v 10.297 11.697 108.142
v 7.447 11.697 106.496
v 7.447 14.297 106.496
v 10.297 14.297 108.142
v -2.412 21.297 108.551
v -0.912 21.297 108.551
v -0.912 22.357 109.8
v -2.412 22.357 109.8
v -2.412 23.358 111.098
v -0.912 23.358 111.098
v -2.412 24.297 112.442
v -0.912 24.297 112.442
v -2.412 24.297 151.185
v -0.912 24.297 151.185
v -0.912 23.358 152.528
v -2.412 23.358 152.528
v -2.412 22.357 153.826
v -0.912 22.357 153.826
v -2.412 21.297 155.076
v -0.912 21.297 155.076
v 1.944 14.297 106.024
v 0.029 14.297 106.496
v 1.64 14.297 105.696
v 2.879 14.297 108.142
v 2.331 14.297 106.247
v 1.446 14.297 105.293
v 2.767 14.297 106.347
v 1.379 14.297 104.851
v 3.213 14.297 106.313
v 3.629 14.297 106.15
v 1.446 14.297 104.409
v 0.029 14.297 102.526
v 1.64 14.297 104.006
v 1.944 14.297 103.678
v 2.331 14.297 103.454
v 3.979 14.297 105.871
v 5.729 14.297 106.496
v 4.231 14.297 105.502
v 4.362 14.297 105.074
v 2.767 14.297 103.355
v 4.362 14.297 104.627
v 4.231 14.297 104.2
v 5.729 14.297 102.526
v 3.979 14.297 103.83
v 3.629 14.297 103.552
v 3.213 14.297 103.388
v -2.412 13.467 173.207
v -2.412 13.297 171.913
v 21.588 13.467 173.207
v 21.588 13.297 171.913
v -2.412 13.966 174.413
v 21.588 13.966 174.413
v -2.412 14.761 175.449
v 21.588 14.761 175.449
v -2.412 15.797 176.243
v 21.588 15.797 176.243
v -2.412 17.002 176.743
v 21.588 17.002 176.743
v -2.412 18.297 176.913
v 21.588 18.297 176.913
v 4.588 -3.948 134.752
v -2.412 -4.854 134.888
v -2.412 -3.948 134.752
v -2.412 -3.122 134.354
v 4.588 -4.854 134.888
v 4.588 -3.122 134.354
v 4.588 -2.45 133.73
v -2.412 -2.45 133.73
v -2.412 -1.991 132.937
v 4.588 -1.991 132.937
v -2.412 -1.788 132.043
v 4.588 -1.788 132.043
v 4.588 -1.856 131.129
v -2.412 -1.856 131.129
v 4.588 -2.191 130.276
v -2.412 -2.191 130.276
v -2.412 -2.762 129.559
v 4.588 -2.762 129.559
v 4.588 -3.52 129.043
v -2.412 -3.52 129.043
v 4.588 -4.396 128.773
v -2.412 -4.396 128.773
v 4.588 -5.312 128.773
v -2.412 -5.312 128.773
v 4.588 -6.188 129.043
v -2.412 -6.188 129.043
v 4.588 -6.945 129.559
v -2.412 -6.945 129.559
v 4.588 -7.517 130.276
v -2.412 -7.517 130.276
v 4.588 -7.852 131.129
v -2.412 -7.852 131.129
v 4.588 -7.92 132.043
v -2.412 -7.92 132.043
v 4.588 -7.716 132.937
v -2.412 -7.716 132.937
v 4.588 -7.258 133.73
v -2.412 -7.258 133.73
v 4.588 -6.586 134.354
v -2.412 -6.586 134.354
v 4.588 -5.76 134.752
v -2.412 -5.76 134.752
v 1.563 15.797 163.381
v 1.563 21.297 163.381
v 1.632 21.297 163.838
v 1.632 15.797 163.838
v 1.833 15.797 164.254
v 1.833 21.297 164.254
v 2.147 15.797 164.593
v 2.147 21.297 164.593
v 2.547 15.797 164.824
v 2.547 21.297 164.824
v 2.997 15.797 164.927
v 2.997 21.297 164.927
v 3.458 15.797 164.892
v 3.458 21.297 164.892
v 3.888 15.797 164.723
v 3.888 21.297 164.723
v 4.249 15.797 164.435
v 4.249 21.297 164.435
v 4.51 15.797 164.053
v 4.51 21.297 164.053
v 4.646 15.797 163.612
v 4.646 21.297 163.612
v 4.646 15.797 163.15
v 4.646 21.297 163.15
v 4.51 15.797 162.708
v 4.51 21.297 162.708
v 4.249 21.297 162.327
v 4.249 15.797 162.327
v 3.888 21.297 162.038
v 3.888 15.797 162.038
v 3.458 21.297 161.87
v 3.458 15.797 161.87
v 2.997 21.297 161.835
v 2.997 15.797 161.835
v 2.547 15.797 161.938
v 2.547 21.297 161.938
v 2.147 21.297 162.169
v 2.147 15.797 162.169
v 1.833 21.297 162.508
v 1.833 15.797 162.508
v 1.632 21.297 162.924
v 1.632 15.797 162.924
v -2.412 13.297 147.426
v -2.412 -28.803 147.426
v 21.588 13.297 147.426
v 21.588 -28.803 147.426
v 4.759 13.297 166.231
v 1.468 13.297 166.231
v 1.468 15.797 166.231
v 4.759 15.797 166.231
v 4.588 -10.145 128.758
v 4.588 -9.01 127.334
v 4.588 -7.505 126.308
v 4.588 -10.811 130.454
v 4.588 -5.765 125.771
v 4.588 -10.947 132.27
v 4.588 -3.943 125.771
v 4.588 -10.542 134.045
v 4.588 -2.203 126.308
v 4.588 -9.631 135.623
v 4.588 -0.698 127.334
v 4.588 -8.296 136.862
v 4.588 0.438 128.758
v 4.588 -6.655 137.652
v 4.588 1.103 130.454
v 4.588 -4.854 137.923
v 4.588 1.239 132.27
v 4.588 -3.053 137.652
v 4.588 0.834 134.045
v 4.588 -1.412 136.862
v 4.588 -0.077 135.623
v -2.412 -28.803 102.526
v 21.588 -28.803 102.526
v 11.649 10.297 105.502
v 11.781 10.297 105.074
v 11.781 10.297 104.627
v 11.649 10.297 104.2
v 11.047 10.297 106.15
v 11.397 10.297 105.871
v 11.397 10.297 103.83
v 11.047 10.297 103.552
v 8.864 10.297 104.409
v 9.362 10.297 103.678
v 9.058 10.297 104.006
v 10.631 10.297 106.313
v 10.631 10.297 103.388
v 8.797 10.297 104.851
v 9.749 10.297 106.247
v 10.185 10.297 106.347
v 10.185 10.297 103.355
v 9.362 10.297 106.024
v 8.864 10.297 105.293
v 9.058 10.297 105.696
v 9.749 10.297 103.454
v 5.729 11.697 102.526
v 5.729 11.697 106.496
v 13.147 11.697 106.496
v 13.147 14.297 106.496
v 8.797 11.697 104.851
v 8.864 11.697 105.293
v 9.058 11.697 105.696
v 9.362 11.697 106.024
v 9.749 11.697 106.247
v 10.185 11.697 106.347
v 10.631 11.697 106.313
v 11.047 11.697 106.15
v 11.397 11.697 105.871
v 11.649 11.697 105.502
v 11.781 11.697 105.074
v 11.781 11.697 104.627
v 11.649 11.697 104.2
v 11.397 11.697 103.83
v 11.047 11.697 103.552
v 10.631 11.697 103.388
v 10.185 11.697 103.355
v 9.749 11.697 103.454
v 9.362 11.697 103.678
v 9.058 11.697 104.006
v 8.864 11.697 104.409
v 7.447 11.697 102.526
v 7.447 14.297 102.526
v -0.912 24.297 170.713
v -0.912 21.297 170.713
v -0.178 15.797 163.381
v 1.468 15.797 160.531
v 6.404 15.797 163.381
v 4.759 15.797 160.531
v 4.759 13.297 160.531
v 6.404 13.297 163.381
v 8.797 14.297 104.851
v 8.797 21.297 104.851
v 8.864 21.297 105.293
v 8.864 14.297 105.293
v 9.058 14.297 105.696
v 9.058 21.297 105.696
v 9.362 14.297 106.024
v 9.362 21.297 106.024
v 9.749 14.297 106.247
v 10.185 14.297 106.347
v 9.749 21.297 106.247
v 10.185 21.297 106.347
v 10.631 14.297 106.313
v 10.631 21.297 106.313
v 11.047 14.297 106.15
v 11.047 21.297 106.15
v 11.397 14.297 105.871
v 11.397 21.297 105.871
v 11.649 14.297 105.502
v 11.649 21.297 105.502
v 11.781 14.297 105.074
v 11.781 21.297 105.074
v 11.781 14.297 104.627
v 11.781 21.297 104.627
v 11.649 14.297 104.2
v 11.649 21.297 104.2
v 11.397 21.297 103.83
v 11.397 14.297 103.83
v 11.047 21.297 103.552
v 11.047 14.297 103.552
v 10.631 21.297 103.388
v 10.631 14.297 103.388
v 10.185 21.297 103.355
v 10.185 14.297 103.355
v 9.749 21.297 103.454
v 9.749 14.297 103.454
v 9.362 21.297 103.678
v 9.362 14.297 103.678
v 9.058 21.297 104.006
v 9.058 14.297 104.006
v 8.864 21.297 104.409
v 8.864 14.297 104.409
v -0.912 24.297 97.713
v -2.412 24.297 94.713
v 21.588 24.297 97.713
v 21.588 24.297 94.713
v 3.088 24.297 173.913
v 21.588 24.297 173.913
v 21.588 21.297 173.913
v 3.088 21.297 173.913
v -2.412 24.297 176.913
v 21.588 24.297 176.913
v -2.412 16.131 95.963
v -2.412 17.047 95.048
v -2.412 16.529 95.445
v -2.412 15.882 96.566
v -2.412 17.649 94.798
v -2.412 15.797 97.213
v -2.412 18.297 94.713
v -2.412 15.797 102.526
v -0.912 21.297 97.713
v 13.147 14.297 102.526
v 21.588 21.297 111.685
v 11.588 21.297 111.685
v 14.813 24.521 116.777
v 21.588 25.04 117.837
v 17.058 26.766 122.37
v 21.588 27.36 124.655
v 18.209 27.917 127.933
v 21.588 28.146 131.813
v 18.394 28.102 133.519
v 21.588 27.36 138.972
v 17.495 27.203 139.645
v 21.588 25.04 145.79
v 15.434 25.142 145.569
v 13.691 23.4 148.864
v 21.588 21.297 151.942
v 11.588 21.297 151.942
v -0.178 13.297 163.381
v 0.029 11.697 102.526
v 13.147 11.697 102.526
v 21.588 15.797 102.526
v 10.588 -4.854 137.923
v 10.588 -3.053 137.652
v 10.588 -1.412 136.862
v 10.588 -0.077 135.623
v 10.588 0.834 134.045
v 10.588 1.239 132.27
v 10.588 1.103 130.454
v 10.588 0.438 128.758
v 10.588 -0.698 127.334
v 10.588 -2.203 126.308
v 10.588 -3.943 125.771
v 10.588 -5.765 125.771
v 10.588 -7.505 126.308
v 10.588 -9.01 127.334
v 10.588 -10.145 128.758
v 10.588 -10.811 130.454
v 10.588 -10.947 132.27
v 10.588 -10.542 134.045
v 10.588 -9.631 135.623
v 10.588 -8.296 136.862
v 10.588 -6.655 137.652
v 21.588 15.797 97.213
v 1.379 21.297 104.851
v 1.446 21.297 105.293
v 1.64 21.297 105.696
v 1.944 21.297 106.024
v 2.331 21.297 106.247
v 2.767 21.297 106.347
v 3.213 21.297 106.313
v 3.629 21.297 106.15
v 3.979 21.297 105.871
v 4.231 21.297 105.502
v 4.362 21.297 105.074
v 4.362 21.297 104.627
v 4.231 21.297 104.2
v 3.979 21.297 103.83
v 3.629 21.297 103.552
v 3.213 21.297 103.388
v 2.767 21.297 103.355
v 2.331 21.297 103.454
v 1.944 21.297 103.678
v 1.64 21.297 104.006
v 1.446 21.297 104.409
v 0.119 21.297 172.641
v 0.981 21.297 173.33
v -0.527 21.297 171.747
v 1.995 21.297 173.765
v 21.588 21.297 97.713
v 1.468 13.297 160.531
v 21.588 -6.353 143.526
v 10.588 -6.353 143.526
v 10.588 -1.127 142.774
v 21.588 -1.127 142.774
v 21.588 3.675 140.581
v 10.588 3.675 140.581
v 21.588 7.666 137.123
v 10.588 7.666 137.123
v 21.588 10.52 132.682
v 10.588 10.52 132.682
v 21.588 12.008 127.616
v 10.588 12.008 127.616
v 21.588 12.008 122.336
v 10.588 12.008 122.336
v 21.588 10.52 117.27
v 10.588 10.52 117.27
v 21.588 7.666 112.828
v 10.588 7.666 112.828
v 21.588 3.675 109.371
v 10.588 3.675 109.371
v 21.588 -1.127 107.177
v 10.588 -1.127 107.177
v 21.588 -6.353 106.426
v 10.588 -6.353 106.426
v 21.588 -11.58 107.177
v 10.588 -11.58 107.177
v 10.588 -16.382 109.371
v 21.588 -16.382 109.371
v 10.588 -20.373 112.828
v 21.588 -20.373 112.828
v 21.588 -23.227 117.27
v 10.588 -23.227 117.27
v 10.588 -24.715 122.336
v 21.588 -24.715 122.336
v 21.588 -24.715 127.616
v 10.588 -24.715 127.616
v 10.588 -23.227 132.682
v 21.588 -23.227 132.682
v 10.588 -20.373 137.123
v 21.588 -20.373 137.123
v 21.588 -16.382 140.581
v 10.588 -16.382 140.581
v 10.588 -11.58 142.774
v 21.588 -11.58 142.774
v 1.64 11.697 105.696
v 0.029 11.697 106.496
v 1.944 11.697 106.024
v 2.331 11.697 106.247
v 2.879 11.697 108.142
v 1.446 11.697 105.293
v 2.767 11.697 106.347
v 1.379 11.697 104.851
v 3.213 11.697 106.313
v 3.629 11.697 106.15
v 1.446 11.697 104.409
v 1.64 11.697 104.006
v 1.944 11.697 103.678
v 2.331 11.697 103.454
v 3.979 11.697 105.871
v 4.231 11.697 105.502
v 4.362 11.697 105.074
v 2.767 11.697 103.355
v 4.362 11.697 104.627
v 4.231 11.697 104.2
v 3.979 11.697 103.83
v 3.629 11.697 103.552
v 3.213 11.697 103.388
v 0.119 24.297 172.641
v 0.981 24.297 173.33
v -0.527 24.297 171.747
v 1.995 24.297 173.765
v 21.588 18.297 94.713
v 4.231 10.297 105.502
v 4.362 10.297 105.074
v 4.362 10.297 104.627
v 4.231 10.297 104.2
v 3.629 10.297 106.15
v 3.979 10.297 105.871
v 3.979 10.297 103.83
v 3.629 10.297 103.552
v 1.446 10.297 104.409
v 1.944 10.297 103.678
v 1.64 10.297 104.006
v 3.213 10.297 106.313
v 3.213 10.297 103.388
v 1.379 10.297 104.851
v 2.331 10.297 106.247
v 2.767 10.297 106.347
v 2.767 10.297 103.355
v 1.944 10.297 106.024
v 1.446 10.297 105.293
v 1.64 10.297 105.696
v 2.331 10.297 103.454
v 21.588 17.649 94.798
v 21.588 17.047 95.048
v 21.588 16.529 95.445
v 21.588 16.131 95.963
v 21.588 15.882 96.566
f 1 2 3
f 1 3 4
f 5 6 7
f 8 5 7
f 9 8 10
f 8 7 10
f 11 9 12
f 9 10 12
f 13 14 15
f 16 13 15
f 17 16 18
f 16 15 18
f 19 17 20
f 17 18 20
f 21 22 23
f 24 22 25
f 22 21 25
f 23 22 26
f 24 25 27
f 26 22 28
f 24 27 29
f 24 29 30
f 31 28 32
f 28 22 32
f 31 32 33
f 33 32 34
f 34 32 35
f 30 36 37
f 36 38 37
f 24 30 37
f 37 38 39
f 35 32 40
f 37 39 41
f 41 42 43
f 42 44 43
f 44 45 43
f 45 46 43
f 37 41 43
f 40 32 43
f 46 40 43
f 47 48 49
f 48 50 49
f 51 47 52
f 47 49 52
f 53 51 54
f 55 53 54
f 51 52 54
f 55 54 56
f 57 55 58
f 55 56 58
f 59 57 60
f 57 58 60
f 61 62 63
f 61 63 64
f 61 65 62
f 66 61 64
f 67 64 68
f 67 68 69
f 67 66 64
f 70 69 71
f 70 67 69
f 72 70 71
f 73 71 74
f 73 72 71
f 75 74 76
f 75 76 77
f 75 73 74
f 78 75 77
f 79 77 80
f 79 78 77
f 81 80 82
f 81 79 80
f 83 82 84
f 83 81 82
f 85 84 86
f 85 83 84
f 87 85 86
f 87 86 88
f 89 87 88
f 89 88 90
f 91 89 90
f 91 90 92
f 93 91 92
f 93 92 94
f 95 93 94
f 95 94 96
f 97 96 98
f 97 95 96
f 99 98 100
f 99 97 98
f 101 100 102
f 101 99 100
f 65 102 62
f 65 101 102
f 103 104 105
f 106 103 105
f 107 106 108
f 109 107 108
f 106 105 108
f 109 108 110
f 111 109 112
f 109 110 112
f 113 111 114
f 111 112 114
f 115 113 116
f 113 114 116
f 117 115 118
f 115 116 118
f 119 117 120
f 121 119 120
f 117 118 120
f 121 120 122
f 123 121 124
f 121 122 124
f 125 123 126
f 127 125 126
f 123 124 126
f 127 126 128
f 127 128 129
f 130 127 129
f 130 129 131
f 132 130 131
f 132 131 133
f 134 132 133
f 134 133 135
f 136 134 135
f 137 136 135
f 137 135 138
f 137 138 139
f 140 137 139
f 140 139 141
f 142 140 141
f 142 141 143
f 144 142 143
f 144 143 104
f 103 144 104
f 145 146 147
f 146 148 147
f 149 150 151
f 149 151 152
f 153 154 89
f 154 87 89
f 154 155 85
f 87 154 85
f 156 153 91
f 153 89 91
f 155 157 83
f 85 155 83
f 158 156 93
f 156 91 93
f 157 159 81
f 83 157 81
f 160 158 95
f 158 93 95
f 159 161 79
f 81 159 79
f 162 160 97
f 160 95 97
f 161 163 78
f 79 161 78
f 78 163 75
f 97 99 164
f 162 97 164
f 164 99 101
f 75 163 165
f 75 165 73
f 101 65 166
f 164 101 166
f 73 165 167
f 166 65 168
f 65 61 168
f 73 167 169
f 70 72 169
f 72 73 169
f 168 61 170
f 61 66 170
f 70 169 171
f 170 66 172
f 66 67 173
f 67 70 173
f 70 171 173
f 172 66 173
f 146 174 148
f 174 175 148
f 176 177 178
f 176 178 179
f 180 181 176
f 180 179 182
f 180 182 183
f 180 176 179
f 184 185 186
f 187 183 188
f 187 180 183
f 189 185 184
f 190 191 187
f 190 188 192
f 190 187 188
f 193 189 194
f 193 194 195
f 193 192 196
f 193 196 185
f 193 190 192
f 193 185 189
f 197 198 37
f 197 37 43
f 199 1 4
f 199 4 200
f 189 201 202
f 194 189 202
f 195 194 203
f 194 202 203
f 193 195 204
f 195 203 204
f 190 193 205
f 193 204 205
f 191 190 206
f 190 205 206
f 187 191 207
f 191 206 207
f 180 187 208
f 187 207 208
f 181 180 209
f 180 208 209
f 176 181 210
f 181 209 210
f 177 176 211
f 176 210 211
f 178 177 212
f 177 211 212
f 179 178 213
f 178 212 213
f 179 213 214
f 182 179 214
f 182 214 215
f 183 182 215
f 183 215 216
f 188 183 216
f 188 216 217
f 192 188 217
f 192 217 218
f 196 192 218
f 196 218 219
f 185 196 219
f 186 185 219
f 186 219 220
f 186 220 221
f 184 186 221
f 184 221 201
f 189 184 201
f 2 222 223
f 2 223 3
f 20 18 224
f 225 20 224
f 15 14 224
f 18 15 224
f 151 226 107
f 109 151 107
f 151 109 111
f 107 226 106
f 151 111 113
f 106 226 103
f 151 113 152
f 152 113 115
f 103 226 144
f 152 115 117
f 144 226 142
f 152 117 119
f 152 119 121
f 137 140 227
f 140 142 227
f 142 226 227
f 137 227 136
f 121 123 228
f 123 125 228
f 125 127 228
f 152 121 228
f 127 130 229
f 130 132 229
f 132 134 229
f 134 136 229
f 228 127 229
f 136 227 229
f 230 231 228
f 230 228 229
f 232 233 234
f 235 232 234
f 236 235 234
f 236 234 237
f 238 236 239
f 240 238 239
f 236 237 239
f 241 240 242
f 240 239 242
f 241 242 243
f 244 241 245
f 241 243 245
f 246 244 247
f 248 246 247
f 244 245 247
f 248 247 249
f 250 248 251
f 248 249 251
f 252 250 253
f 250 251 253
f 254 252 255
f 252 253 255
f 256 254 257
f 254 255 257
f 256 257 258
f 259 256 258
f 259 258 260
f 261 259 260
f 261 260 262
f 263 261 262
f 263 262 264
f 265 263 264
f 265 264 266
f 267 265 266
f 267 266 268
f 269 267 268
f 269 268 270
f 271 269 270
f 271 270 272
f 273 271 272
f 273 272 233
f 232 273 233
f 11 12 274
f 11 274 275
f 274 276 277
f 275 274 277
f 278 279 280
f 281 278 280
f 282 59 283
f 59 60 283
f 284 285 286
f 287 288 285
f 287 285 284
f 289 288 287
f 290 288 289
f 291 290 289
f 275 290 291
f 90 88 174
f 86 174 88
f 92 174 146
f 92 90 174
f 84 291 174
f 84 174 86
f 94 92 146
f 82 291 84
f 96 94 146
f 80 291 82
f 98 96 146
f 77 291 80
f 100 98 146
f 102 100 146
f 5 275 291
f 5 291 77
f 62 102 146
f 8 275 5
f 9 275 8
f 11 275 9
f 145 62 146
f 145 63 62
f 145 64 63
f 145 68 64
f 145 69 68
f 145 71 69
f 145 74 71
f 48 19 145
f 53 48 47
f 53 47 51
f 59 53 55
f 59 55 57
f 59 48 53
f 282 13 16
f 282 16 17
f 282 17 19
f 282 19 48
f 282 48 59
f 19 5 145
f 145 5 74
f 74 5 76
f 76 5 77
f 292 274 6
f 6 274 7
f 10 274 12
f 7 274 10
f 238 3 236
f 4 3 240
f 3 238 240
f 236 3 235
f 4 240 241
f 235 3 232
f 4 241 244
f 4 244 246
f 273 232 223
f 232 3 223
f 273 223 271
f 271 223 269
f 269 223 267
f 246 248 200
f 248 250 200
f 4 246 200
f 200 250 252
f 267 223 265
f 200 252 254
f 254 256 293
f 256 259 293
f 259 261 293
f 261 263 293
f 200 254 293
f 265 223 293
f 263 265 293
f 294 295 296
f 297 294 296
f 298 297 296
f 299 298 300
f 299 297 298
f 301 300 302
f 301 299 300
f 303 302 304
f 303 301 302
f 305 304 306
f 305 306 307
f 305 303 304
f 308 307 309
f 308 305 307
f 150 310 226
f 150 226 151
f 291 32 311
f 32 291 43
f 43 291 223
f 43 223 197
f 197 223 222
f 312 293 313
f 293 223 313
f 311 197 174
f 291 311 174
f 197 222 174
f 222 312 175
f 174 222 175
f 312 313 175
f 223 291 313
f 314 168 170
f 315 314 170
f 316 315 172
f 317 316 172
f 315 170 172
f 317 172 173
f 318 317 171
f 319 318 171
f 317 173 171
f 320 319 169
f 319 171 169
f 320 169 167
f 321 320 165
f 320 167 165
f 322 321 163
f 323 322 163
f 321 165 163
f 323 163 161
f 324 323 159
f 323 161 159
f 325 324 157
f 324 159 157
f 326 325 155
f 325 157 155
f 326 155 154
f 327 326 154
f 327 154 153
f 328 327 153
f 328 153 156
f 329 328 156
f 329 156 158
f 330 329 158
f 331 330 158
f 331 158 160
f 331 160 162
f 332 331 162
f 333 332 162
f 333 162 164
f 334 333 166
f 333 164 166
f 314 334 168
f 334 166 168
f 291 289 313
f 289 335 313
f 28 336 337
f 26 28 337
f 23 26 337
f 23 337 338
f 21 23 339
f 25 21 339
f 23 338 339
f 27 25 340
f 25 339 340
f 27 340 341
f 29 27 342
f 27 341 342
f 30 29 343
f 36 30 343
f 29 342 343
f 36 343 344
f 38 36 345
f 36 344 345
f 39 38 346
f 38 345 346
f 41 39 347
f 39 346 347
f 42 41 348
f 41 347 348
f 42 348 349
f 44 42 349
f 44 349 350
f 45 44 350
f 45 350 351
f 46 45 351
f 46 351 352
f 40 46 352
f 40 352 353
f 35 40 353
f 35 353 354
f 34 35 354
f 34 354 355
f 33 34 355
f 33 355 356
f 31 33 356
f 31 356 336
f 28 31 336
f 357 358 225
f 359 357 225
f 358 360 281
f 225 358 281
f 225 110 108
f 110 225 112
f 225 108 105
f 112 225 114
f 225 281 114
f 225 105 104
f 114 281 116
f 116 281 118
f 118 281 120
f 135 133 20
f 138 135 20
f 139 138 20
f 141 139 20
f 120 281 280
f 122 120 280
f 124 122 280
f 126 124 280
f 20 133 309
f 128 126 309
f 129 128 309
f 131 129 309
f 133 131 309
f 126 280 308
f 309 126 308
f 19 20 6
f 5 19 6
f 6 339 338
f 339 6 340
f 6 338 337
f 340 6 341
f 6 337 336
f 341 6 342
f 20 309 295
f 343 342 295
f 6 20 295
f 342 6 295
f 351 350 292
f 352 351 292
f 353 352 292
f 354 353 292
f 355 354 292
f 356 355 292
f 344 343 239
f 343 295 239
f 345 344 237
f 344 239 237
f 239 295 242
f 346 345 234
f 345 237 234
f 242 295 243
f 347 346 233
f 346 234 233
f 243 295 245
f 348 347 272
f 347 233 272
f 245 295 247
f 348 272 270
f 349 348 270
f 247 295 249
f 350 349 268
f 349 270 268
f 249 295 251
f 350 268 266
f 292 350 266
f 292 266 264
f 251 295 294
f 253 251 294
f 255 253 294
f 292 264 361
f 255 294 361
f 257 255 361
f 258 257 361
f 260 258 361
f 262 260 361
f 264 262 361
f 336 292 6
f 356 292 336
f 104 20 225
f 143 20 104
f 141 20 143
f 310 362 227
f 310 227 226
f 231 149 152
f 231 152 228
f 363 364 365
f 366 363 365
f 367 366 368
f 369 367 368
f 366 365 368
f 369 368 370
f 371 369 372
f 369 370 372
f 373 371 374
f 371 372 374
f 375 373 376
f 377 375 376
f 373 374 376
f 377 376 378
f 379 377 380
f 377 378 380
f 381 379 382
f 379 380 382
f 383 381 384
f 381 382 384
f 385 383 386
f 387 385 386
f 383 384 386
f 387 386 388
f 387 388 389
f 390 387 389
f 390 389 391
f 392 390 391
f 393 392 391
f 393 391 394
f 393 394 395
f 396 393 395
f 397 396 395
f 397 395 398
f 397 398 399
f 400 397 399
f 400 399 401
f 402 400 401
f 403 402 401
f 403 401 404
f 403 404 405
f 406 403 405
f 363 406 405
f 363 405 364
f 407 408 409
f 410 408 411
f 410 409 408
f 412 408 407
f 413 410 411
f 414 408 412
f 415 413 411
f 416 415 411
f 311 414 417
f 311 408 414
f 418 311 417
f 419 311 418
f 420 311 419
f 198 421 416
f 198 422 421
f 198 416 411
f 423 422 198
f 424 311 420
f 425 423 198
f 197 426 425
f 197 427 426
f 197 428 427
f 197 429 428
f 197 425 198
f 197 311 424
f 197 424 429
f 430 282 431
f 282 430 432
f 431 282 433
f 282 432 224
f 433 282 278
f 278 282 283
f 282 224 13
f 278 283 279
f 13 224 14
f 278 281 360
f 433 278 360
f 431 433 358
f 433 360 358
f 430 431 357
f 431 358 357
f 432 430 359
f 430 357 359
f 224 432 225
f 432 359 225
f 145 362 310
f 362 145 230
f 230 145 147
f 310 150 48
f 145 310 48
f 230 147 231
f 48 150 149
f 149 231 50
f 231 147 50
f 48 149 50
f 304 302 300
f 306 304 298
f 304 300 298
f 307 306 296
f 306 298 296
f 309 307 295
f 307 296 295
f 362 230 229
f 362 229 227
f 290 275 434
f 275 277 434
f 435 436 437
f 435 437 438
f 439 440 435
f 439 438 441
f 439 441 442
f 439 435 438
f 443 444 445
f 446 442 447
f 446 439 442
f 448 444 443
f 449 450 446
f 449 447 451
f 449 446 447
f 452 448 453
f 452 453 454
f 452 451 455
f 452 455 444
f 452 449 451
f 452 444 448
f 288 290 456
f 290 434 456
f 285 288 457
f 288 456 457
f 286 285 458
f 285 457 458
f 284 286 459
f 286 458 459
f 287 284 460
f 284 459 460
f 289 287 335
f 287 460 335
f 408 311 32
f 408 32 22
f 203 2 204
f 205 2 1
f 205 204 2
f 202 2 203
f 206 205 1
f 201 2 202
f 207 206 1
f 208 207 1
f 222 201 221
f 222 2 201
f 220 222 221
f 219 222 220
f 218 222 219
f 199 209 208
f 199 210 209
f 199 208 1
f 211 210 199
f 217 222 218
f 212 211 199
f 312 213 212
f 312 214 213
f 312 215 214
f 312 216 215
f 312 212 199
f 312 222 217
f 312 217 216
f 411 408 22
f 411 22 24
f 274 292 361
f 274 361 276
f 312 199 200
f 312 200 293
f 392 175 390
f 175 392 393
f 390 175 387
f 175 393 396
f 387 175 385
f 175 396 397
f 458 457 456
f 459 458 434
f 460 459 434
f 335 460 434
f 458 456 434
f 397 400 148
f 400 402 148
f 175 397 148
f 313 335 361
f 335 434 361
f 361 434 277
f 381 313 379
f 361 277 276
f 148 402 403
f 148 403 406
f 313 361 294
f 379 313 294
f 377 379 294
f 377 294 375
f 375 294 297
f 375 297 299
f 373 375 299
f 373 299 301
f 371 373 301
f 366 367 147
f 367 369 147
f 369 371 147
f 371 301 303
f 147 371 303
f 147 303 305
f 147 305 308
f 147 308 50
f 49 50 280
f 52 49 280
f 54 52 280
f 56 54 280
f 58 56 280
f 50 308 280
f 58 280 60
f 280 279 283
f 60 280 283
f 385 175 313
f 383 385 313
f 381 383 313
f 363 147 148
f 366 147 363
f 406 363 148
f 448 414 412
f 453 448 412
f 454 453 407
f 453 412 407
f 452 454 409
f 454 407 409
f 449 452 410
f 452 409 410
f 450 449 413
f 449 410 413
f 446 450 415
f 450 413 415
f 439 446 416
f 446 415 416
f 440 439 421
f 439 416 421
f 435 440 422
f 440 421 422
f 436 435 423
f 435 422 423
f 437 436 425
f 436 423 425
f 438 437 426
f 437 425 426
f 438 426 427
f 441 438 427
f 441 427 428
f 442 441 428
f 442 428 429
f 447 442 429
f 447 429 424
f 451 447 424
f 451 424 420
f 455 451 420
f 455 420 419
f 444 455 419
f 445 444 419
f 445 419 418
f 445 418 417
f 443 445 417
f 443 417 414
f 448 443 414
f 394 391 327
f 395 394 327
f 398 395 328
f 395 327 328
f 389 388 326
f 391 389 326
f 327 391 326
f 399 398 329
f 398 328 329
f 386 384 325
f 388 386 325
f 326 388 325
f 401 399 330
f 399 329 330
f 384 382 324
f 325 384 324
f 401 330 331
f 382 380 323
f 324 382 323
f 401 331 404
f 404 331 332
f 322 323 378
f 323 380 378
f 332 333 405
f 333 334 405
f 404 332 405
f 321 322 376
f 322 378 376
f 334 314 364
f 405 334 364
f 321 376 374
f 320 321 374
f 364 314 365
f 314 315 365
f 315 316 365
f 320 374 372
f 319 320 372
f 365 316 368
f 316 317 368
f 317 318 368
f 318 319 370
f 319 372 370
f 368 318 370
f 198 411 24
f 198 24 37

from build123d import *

# Parameters (mm, degrees)
SKETCH1_R           = 22.45
SKETCH1_R_2         = 18.55
SKETCH1_R_3         = 6.11
SKETCH1_R_4         = 5.25
SKETCH1_R_5         = 3.075
BOSS_EXTRUDE1_DEPTH = 5.5
SKETCH1_3_R         = 22.45
SKETCH1_3_R_2       = 18.55
SKETCH1_3_R_3       = 6.11
BOSS_EXTRUDE2_DEPTH = 6
SKETCH1_4_R         = 22.45
SKETCH1_4_R_2       = 18.55
BOSS_EXTRUDE3_DEPTH = 17
BOSS_EXTRUDE4_DEPTH = 10
DRAFT1_ANGLE        = 45
BOSS_EXTRUDE5_DEPTH = 3
SKETCH4_R           = 3.075
BOSS_EXTRUDE6_DEPTH = 1.5
SKETCH3_R           = 1.5
SKETCH3_R_2         = 1.55
CUT_EXTRUDE1_DEPTH  = 11
CUT_EXTRUDE2_START  = -9.6
SKETCH3_4_R         = 1.5
CUT_EXTRUDE2_DEPTH  = 2.6
CUT_EXTRUDE3_START  = -8
SKETCH3_5_R         = 1.55
CUT_EXTRUDE3_DEPTH  = 2.5


with BuildPart() as part:
    # Sketch1 → Boss-Extrude1 (new body)
    with BuildSketch(Plane.ZY.offset(-4.58817912)):
        with BuildLine():
            Line((173.913255387, 21.29653024), (97.713255387, 21.29653024))
            Line((97.713255387, 21.29653024), (97.713255387, 24.29653024))
            Line((97.713255387, 24.29653024), (94.713255387, 24.29653024))
            Line((94.713255387, 24.29653024), (94.713255387, 18.29653024))
            ThreePointArc((94.713255387, 18.29653024), (95.445488434, 16.528763287), (97.213255387, 15.79653024))
            Line((97.213255387, 15.79653024), (102.52576333, 15.79653024))
            Line((102.52576333, 15.79653024), (102.52576333, -6.35346976))
            ThreePointArc((102.52576333, -6.35346976), (124.97576333, 16.09653024), (147.42576333, -6.35346976))
            Line((147.42576333, -6.35346976), (147.42576333, 13.29653024))
            Line((147.42576333, 13.29653024), (171.913255387, 13.29653024))
            ThreePointArc((171.913255387, 13.29653024), (175.448789293, 14.760996334), (176.913255387, 18.29653024))
            Line((176.913255387, 18.29653024), (176.913255387, 24.29653024))
            Line((176.913255387, 24.29653024), (173.913255387, 24.29653024))
            Line((173.913255387, 24.29653024), (173.913255387, 21.29653024))
        make_face()
        with BuildLine():
            ThreePointArc((124.97576333, -28.80346976), (109.101216092, -22.228016998), (102.52576333, -6.35346976))
            Line((102.52576333, -6.35346976), (102.52576333, -28.80346976))
            Line((102.52576333, -28.80346976), (124.97576333, -28.80346976))
        make_face()
        with Locations((124.97576333, -6.35346976)):
            Circle(SKETCH1_R)
        with Locations((124.97576333, -6.35346976)):
            Circle(SKETCH1_R_2, mode=Mode.SUBTRACT)
        with Locations((124.97576333, -6.35346976)):
            Circle(SKETCH1_R_2)
        with Locations((131.813255387, -4.853902367)):
            Circle(SKETCH1_R_3, mode=Mode.SUBTRACT)
        with Locations((131.813255387, -4.853902367)):
            Circle(SKETCH1_R_3)
        with Locations((131.813255387, -4.853902367)):
            Circle(SKETCH1_R_4, mode=Mode.SUBTRACT)
        with Locations((131.813255387, -4.853902367)):
            Circle(SKETCH1_R_4)
        with Locations((131.813255387, -4.853902367)):
            Circle(SKETCH1_R_5, mode=Mode.SUBTRACT)
        with BuildLine():
            Line((147.42576333, -28.80346976), (147.42576333, -6.35346976))
            ThreePointArc((147.42576333, -6.35346976), (140.850310568, -22.228016998), (124.97576333, -28.80346976))
            Line((124.97576333, -28.80346976), (147.42576333, -28.80346976))
        make_face()
    extrude(amount=BOSS_EXTRUDE1_DEPTH)

    # Sketch1<3> → Boss-Extrude2 (add)
    with BuildSketch(Plane.ZY.offset(-4.58817912)):
        with BuildLine():
            Line((173.913255387, 21.29653024), (97.713255387, 21.29653024))
            Line((97.713255387, 21.29653024), (97.713255387, 24.29653024))
            Line((97.713255387, 24.29653024), (94.713255387, 24.29653024))
            Line((94.713255387, 24.29653024), (94.713255387, 18.29653024))
            ThreePointArc((94.713255387, 18.29653024), (95.445488434, 16.528763287), (97.213255387, 15.79653024))
            Line((97.213255387, 15.79653024), (102.52576333, 15.79653024))
            Line((102.52576333, 15.79653024), (102.52576333, -6.35346976))
            ThreePointArc((102.52576333, -6.35346976), (124.97576333, 16.09653024), (147.42576333, -6.35346976))
            Line((147.42576333, -6.35346976), (147.42576333, 13.29653024))
            Line((147.42576333, 13.29653024), (171.913255387, 13.29653024))
            ThreePointArc((171.913255387, 13.29653024), (175.448789293, 14.760996334), (176.913255387, 18.29653024))
            Line((176.913255387, 18.29653024), (176.913255387, 24.29653024))
            Line((176.913255387, 24.29653024), (173.913255387, 24.29653024))
            Line((173.913255387, 24.29653024), (173.913255387, 21.29653024))
        make_face()
        with BuildLine():
            Line((147.42576333, -28.80346976), (147.42576333, -6.35346976))
            ThreePointArc((147.42576333, -6.35346976), (140.850310568, -22.228016998), (124.97576333, -28.80346976))
            Line((124.97576333, -28.80346976), (147.42576333, -28.80346976))
        make_face()
        with Locations((124.97576333, -6.35346976)):
            Circle(SKETCH1_3_R)
        with Locations((124.97576333, -6.35346976)):
            Circle(SKETCH1_3_R_2, mode=Mode.SUBTRACT)
        with Locations((124.97576333, -6.35346976)):
            Circle(SKETCH1_3_R_2)
        with Locations((131.813255387, -4.853902367)):
            Circle(SKETCH1_3_R_3, mode=Mode.SUBTRACT)
    extrude(amount=-BOSS_EXTRUDE2_DEPTH)

    # Sketch1<4> → Boss-Extrude3 (add)
    with BuildSketch(Plane.ZY.offset(-4.58817912)):
        with BuildLine():
            Line((173.913255387, 21.29653024), (97.713255387, 21.29653024))
            Line((97.713255387, 21.29653024), (97.713255387, 24.29653024))
            Line((97.713255387, 24.29653024), (94.713255387, 24.29653024))
            Line((94.713255387, 24.29653024), (94.713255387, 18.29653024))
            ThreePointArc((94.713255387, 18.29653024), (95.445488434, 16.528763287), (97.213255387, 15.79653024))
            Line((97.213255387, 15.79653024), (102.52576333, 15.79653024))
            Line((102.52576333, 15.79653024), (102.52576333, -6.35346976))
            ThreePointArc((102.52576333, -6.35346976), (124.97576333, 16.09653024), (147.42576333, -6.35346976))
            Line((147.42576333, -6.35346976), (147.42576333, 13.29653024))
            Line((147.42576333, 13.29653024), (171.913255387, 13.29653024))
            ThreePointArc((171.913255387, 13.29653024), (175.448789293, 14.760996334), (176.913255387, 18.29653024))
            Line((176.913255387, 18.29653024), (176.913255387, 24.29653024))
            Line((176.913255387, 24.29653024), (173.913255387, 24.29653024))
            Line((173.913255387, 24.29653024), (173.913255387, 21.29653024))
        make_face()
        with BuildLine():
            Line((147.42576333, -28.80346976), (147.42576333, -6.35346976))
            ThreePointArc((147.42576333, -6.35346976), (140.850310568, -22.228016998), (124.97576333, -28.80346976))
            Line((124.97576333, -28.80346976), (147.42576333, -28.80346976))
        make_face()
        with BuildLine():
            ThreePointArc((124.97576333, -28.80346976), (109.101216092, -22.228016998), (102.52576333, -6.35346976))
            Line((102.52576333, -6.35346976), (102.52576333, -28.80346976))
            Line((102.52576333, -28.80346976), (124.97576333, -28.80346976))
        make_face()
        with Locations((124.97576333, -6.35346976)):
            Circle(SKETCH1_4_R)
        with Locations((124.97576333, -6.35346976)):
            Circle(SKETCH1_4_R_2, mode=Mode.SUBTRACT)
    extrude(amount=-BOSS_EXTRUDE3_DEPTH)

    # Sketch2 → Boss-Extrude4 (add)
    with BuildSketch(Plane(origin=(21.58817912, 0, 0), x_dir=(0, 0, -1), z_dir=(1, 0, 0))):
        with BuildLine():
            Line((-151.941714705, 21.29653024), (-111.68479607, 21.29653024))
            ThreePointArc((-111.68479607, 21.29653024), (-131.813255387, 28.146097633), (-151.941714705, 21.29653024))
        make_face()
    extrude(amount=-BOSS_EXTRUDE4_DEPTH)

    # Draft1
    draft1_faces = [part.faces().sort_by_distance(p)[0] for p in [
        (11.58817912, 24.062292156, 131.813255387),
    ]]
    draft(draft1_faces, Plane(origin=(-98.771158707, 21.29653024, 0), x_dir=(1, 0, 0), z_dir=(0, 1, 0)), DRAFT1_ANGLE)

    # Sketch3<3> → Boss-Extrude5 (add)
    with BuildSketch(Plane(origin=(0, 21.29653024, 0), x_dir=(1, 0, 0), z_dir=(0, 1, 0))):
        with BuildLine():
            Line((-0.91182088, -173.913255387), (3.08817912, -173.913255387))
            ThreePointArc((3.08817912, -173.913255387), (0.526929425, -173.014817506), (-0.91182088, -170.713255387))
            Line((-0.91182088, -170.713255387), (-0.91182088, -173.913255387))
        make_face()
    extrude(amount=BOSS_EXTRUDE5_DEPTH)

    # Sketch4 → Boss-Extrude6 (add)
    with BuildSketch(Plane.ZY.offset(0.91182088)):
        with BuildLine():
            Line((97.713255387, 21.29653024), (97.713255387, 24.29653024))
            Line((97.713255387, 24.29653024), (94.713255387, 24.29653024))
            Line((94.713255387, 24.29653024), (94.713255387, 18.29653024))
            ThreePointArc((94.713255387, 18.29653024), (95.445488434, 16.528763287), (97.213255387, 15.79653024))
            Line((97.213255387, 15.79653024), (102.52576333, 15.79653024))
            Line((102.52576333, 15.79653024), (102.52576333, -28.80346976))
            Line((102.52576333, -28.80346976), (147.42576333, -28.80346976))
            Line((147.42576333, -28.80346976), (147.42576333, 13.29653024))
            Line((147.42576333, 13.29653024), (171.913255387, 13.29653024))
            ThreePointArc((171.913255387, 13.29653024), (175.448789293, 14.760996334), (176.913255387, 18.29653024))
            Line((176.913255387, 18.29653024), (176.913255387, 24.29653024))
            Line((176.913255387, 24.29653024), (170.713255387, 24.29653024))
            Line((170.713255387, 24.29653024), (170.713255387, 21.29653024))
            Line((170.713255387, 21.29653024), (155.075991135, 21.29653024))
            Line((155.075991135, 21.29653024), (108.550519639, 21.29653024))
            Line((108.550519639, 21.29653024), (97.713255387, 21.29653024))
        make_face()
        with Locations((131.813255387, -4.853902367)):
            Circle(SKETCH4_R, mode=Mode.SUBTRACT)
        with BuildLine():
            Line((112.44182594, 24.29653024), (97.713255387, 24.29653024))
            Line((97.713255387, 24.29653024), (97.713255387, 21.29653024))
            Line((97.713255387, 21.29653024), (108.550519639, 21.29653024))
            ThreePointArc((108.550519639, 21.29653024), (110.443463379, 22.864899727), (112.44182594, 24.29653024))
        make_face()
        with BuildLine():
            ThreePointArc((151.184684835, 24.29653024), (153.183047396, 22.864899727), (155.075991135, 21.29653024))
            Line((155.075991135, 21.29653024), (170.713255387, 21.29653024))
            Line((170.713255387, 21.29653024), (170.713255387, 24.29653024))
            Line((170.713255387, 24.29653024), (151.184684835, 24.29653024))
        make_face()
    extrude(amount=BOSS_EXTRUDE6_DEPTH)

    # Sketch3 → Cut-Extrude1 (cut)
    with BuildSketch(Plane(origin=(0, 21.29653024, 0), x_dir=(1, 0, 0), z_dir=(0, 1, 0))):
        with Locations(Location((2.879075654, -104.850755387, 0), (0, 0, 180))):
            Circle(SKETCH3_R)
        with Locations(Location((10.297282585, -104.850755387, 0), (0, 0, 180))):
            Circle(SKETCH3_R)
        with Locations(Location((3.11317912, -163.38083505, 0), (0, 0, 180))):
            Circle(SKETCH3_R_2)
    extrude(amount=-CUT_EXTRUDE1_DEPTH, mode=Mode.SUBTRACT)

    # Sketch3<4> → Cut-Extrude2 (cut)
    with BuildSketch(Plane(origin=(0, 21.29653024, 0), x_dir=(1, 0, 0), z_dir=(0, 1, 0)).offset(CUT_EXTRUDE2_START)):
        Polygon((7.447282585, -106.496203654), (10.297282585, -108.141651922), (13.147282585, -106.496203654), (13.147282585, -103.20530712), (11.970278215, -102.52576333), (8.624286956, -102.52576333), (7.447282585, -103.20530712), align=None)
        with Locations(Location((10.297282585, -104.850755387, 0), (0, 0, 180))):
            Circle(SKETCH3_4_R, mode=Mode.SUBTRACT)
        Polygon((11.970278215, -102.52576333), (13.147282585, -103.20530712), (13.147282585, -102.52576333), align=None)
        Polygon((7.447282585, -102.52576333), (7.447282585, -103.20530712), (8.624286956, -102.52576333), align=None)
        Polygon((0.029075654, -106.496203654), (2.879075654, -108.141651922), (5.729075654, -106.496203654), (5.729075654, -103.20530712), (4.552071284, -102.52576333), (1.206080025, -102.52576333), (0.029075654, -103.20530712), align=None)
        with Locations(Location((2.879075654, -104.850755387, 0), (0, 0, 180))):
            Circle(SKETCH3_4_R, mode=Mode.SUBTRACT)
        Polygon((4.552071284, -102.52576333), (5.729075654, -103.20530712), (5.729075654, -102.52576333), align=None)
        Polygon((0.029075654, -102.52576333), (0.029075654, -103.20530712), (1.206080025, -102.52576333), align=None)
    extrude(amount=CUT_EXTRUDE2_DEPTH, mode=Mode.SUBTRACT)

    # Sketch3<5> → Cut-Extrude3 (cut)
    with BuildSketch(Plane(origin=(0, 21.29653024, 0), x_dir=(1, 0, 0), z_dir=(0, 1, 0)).offset(CUT_EXTRUDE3_START)):
        Polygon((4.758627387, -160.53083505), (1.467730853, -160.53083505), (-0.177717415, -163.38083505), (1.467730853, -166.23083505), (4.758627387, -166.23083505), (6.404075654, -163.38083505), align=None)
        with Locations(Location((3.11317912, -163.38083505, 0), (0, 0, 180))):
            Circle(SKETCH3_5_R, mode=Mode.SUBTRACT)
    extrude(amount=CUT_EXTRUDE3_DEPTH, mode=Mode.SUBTRACT)


solid = part.part
